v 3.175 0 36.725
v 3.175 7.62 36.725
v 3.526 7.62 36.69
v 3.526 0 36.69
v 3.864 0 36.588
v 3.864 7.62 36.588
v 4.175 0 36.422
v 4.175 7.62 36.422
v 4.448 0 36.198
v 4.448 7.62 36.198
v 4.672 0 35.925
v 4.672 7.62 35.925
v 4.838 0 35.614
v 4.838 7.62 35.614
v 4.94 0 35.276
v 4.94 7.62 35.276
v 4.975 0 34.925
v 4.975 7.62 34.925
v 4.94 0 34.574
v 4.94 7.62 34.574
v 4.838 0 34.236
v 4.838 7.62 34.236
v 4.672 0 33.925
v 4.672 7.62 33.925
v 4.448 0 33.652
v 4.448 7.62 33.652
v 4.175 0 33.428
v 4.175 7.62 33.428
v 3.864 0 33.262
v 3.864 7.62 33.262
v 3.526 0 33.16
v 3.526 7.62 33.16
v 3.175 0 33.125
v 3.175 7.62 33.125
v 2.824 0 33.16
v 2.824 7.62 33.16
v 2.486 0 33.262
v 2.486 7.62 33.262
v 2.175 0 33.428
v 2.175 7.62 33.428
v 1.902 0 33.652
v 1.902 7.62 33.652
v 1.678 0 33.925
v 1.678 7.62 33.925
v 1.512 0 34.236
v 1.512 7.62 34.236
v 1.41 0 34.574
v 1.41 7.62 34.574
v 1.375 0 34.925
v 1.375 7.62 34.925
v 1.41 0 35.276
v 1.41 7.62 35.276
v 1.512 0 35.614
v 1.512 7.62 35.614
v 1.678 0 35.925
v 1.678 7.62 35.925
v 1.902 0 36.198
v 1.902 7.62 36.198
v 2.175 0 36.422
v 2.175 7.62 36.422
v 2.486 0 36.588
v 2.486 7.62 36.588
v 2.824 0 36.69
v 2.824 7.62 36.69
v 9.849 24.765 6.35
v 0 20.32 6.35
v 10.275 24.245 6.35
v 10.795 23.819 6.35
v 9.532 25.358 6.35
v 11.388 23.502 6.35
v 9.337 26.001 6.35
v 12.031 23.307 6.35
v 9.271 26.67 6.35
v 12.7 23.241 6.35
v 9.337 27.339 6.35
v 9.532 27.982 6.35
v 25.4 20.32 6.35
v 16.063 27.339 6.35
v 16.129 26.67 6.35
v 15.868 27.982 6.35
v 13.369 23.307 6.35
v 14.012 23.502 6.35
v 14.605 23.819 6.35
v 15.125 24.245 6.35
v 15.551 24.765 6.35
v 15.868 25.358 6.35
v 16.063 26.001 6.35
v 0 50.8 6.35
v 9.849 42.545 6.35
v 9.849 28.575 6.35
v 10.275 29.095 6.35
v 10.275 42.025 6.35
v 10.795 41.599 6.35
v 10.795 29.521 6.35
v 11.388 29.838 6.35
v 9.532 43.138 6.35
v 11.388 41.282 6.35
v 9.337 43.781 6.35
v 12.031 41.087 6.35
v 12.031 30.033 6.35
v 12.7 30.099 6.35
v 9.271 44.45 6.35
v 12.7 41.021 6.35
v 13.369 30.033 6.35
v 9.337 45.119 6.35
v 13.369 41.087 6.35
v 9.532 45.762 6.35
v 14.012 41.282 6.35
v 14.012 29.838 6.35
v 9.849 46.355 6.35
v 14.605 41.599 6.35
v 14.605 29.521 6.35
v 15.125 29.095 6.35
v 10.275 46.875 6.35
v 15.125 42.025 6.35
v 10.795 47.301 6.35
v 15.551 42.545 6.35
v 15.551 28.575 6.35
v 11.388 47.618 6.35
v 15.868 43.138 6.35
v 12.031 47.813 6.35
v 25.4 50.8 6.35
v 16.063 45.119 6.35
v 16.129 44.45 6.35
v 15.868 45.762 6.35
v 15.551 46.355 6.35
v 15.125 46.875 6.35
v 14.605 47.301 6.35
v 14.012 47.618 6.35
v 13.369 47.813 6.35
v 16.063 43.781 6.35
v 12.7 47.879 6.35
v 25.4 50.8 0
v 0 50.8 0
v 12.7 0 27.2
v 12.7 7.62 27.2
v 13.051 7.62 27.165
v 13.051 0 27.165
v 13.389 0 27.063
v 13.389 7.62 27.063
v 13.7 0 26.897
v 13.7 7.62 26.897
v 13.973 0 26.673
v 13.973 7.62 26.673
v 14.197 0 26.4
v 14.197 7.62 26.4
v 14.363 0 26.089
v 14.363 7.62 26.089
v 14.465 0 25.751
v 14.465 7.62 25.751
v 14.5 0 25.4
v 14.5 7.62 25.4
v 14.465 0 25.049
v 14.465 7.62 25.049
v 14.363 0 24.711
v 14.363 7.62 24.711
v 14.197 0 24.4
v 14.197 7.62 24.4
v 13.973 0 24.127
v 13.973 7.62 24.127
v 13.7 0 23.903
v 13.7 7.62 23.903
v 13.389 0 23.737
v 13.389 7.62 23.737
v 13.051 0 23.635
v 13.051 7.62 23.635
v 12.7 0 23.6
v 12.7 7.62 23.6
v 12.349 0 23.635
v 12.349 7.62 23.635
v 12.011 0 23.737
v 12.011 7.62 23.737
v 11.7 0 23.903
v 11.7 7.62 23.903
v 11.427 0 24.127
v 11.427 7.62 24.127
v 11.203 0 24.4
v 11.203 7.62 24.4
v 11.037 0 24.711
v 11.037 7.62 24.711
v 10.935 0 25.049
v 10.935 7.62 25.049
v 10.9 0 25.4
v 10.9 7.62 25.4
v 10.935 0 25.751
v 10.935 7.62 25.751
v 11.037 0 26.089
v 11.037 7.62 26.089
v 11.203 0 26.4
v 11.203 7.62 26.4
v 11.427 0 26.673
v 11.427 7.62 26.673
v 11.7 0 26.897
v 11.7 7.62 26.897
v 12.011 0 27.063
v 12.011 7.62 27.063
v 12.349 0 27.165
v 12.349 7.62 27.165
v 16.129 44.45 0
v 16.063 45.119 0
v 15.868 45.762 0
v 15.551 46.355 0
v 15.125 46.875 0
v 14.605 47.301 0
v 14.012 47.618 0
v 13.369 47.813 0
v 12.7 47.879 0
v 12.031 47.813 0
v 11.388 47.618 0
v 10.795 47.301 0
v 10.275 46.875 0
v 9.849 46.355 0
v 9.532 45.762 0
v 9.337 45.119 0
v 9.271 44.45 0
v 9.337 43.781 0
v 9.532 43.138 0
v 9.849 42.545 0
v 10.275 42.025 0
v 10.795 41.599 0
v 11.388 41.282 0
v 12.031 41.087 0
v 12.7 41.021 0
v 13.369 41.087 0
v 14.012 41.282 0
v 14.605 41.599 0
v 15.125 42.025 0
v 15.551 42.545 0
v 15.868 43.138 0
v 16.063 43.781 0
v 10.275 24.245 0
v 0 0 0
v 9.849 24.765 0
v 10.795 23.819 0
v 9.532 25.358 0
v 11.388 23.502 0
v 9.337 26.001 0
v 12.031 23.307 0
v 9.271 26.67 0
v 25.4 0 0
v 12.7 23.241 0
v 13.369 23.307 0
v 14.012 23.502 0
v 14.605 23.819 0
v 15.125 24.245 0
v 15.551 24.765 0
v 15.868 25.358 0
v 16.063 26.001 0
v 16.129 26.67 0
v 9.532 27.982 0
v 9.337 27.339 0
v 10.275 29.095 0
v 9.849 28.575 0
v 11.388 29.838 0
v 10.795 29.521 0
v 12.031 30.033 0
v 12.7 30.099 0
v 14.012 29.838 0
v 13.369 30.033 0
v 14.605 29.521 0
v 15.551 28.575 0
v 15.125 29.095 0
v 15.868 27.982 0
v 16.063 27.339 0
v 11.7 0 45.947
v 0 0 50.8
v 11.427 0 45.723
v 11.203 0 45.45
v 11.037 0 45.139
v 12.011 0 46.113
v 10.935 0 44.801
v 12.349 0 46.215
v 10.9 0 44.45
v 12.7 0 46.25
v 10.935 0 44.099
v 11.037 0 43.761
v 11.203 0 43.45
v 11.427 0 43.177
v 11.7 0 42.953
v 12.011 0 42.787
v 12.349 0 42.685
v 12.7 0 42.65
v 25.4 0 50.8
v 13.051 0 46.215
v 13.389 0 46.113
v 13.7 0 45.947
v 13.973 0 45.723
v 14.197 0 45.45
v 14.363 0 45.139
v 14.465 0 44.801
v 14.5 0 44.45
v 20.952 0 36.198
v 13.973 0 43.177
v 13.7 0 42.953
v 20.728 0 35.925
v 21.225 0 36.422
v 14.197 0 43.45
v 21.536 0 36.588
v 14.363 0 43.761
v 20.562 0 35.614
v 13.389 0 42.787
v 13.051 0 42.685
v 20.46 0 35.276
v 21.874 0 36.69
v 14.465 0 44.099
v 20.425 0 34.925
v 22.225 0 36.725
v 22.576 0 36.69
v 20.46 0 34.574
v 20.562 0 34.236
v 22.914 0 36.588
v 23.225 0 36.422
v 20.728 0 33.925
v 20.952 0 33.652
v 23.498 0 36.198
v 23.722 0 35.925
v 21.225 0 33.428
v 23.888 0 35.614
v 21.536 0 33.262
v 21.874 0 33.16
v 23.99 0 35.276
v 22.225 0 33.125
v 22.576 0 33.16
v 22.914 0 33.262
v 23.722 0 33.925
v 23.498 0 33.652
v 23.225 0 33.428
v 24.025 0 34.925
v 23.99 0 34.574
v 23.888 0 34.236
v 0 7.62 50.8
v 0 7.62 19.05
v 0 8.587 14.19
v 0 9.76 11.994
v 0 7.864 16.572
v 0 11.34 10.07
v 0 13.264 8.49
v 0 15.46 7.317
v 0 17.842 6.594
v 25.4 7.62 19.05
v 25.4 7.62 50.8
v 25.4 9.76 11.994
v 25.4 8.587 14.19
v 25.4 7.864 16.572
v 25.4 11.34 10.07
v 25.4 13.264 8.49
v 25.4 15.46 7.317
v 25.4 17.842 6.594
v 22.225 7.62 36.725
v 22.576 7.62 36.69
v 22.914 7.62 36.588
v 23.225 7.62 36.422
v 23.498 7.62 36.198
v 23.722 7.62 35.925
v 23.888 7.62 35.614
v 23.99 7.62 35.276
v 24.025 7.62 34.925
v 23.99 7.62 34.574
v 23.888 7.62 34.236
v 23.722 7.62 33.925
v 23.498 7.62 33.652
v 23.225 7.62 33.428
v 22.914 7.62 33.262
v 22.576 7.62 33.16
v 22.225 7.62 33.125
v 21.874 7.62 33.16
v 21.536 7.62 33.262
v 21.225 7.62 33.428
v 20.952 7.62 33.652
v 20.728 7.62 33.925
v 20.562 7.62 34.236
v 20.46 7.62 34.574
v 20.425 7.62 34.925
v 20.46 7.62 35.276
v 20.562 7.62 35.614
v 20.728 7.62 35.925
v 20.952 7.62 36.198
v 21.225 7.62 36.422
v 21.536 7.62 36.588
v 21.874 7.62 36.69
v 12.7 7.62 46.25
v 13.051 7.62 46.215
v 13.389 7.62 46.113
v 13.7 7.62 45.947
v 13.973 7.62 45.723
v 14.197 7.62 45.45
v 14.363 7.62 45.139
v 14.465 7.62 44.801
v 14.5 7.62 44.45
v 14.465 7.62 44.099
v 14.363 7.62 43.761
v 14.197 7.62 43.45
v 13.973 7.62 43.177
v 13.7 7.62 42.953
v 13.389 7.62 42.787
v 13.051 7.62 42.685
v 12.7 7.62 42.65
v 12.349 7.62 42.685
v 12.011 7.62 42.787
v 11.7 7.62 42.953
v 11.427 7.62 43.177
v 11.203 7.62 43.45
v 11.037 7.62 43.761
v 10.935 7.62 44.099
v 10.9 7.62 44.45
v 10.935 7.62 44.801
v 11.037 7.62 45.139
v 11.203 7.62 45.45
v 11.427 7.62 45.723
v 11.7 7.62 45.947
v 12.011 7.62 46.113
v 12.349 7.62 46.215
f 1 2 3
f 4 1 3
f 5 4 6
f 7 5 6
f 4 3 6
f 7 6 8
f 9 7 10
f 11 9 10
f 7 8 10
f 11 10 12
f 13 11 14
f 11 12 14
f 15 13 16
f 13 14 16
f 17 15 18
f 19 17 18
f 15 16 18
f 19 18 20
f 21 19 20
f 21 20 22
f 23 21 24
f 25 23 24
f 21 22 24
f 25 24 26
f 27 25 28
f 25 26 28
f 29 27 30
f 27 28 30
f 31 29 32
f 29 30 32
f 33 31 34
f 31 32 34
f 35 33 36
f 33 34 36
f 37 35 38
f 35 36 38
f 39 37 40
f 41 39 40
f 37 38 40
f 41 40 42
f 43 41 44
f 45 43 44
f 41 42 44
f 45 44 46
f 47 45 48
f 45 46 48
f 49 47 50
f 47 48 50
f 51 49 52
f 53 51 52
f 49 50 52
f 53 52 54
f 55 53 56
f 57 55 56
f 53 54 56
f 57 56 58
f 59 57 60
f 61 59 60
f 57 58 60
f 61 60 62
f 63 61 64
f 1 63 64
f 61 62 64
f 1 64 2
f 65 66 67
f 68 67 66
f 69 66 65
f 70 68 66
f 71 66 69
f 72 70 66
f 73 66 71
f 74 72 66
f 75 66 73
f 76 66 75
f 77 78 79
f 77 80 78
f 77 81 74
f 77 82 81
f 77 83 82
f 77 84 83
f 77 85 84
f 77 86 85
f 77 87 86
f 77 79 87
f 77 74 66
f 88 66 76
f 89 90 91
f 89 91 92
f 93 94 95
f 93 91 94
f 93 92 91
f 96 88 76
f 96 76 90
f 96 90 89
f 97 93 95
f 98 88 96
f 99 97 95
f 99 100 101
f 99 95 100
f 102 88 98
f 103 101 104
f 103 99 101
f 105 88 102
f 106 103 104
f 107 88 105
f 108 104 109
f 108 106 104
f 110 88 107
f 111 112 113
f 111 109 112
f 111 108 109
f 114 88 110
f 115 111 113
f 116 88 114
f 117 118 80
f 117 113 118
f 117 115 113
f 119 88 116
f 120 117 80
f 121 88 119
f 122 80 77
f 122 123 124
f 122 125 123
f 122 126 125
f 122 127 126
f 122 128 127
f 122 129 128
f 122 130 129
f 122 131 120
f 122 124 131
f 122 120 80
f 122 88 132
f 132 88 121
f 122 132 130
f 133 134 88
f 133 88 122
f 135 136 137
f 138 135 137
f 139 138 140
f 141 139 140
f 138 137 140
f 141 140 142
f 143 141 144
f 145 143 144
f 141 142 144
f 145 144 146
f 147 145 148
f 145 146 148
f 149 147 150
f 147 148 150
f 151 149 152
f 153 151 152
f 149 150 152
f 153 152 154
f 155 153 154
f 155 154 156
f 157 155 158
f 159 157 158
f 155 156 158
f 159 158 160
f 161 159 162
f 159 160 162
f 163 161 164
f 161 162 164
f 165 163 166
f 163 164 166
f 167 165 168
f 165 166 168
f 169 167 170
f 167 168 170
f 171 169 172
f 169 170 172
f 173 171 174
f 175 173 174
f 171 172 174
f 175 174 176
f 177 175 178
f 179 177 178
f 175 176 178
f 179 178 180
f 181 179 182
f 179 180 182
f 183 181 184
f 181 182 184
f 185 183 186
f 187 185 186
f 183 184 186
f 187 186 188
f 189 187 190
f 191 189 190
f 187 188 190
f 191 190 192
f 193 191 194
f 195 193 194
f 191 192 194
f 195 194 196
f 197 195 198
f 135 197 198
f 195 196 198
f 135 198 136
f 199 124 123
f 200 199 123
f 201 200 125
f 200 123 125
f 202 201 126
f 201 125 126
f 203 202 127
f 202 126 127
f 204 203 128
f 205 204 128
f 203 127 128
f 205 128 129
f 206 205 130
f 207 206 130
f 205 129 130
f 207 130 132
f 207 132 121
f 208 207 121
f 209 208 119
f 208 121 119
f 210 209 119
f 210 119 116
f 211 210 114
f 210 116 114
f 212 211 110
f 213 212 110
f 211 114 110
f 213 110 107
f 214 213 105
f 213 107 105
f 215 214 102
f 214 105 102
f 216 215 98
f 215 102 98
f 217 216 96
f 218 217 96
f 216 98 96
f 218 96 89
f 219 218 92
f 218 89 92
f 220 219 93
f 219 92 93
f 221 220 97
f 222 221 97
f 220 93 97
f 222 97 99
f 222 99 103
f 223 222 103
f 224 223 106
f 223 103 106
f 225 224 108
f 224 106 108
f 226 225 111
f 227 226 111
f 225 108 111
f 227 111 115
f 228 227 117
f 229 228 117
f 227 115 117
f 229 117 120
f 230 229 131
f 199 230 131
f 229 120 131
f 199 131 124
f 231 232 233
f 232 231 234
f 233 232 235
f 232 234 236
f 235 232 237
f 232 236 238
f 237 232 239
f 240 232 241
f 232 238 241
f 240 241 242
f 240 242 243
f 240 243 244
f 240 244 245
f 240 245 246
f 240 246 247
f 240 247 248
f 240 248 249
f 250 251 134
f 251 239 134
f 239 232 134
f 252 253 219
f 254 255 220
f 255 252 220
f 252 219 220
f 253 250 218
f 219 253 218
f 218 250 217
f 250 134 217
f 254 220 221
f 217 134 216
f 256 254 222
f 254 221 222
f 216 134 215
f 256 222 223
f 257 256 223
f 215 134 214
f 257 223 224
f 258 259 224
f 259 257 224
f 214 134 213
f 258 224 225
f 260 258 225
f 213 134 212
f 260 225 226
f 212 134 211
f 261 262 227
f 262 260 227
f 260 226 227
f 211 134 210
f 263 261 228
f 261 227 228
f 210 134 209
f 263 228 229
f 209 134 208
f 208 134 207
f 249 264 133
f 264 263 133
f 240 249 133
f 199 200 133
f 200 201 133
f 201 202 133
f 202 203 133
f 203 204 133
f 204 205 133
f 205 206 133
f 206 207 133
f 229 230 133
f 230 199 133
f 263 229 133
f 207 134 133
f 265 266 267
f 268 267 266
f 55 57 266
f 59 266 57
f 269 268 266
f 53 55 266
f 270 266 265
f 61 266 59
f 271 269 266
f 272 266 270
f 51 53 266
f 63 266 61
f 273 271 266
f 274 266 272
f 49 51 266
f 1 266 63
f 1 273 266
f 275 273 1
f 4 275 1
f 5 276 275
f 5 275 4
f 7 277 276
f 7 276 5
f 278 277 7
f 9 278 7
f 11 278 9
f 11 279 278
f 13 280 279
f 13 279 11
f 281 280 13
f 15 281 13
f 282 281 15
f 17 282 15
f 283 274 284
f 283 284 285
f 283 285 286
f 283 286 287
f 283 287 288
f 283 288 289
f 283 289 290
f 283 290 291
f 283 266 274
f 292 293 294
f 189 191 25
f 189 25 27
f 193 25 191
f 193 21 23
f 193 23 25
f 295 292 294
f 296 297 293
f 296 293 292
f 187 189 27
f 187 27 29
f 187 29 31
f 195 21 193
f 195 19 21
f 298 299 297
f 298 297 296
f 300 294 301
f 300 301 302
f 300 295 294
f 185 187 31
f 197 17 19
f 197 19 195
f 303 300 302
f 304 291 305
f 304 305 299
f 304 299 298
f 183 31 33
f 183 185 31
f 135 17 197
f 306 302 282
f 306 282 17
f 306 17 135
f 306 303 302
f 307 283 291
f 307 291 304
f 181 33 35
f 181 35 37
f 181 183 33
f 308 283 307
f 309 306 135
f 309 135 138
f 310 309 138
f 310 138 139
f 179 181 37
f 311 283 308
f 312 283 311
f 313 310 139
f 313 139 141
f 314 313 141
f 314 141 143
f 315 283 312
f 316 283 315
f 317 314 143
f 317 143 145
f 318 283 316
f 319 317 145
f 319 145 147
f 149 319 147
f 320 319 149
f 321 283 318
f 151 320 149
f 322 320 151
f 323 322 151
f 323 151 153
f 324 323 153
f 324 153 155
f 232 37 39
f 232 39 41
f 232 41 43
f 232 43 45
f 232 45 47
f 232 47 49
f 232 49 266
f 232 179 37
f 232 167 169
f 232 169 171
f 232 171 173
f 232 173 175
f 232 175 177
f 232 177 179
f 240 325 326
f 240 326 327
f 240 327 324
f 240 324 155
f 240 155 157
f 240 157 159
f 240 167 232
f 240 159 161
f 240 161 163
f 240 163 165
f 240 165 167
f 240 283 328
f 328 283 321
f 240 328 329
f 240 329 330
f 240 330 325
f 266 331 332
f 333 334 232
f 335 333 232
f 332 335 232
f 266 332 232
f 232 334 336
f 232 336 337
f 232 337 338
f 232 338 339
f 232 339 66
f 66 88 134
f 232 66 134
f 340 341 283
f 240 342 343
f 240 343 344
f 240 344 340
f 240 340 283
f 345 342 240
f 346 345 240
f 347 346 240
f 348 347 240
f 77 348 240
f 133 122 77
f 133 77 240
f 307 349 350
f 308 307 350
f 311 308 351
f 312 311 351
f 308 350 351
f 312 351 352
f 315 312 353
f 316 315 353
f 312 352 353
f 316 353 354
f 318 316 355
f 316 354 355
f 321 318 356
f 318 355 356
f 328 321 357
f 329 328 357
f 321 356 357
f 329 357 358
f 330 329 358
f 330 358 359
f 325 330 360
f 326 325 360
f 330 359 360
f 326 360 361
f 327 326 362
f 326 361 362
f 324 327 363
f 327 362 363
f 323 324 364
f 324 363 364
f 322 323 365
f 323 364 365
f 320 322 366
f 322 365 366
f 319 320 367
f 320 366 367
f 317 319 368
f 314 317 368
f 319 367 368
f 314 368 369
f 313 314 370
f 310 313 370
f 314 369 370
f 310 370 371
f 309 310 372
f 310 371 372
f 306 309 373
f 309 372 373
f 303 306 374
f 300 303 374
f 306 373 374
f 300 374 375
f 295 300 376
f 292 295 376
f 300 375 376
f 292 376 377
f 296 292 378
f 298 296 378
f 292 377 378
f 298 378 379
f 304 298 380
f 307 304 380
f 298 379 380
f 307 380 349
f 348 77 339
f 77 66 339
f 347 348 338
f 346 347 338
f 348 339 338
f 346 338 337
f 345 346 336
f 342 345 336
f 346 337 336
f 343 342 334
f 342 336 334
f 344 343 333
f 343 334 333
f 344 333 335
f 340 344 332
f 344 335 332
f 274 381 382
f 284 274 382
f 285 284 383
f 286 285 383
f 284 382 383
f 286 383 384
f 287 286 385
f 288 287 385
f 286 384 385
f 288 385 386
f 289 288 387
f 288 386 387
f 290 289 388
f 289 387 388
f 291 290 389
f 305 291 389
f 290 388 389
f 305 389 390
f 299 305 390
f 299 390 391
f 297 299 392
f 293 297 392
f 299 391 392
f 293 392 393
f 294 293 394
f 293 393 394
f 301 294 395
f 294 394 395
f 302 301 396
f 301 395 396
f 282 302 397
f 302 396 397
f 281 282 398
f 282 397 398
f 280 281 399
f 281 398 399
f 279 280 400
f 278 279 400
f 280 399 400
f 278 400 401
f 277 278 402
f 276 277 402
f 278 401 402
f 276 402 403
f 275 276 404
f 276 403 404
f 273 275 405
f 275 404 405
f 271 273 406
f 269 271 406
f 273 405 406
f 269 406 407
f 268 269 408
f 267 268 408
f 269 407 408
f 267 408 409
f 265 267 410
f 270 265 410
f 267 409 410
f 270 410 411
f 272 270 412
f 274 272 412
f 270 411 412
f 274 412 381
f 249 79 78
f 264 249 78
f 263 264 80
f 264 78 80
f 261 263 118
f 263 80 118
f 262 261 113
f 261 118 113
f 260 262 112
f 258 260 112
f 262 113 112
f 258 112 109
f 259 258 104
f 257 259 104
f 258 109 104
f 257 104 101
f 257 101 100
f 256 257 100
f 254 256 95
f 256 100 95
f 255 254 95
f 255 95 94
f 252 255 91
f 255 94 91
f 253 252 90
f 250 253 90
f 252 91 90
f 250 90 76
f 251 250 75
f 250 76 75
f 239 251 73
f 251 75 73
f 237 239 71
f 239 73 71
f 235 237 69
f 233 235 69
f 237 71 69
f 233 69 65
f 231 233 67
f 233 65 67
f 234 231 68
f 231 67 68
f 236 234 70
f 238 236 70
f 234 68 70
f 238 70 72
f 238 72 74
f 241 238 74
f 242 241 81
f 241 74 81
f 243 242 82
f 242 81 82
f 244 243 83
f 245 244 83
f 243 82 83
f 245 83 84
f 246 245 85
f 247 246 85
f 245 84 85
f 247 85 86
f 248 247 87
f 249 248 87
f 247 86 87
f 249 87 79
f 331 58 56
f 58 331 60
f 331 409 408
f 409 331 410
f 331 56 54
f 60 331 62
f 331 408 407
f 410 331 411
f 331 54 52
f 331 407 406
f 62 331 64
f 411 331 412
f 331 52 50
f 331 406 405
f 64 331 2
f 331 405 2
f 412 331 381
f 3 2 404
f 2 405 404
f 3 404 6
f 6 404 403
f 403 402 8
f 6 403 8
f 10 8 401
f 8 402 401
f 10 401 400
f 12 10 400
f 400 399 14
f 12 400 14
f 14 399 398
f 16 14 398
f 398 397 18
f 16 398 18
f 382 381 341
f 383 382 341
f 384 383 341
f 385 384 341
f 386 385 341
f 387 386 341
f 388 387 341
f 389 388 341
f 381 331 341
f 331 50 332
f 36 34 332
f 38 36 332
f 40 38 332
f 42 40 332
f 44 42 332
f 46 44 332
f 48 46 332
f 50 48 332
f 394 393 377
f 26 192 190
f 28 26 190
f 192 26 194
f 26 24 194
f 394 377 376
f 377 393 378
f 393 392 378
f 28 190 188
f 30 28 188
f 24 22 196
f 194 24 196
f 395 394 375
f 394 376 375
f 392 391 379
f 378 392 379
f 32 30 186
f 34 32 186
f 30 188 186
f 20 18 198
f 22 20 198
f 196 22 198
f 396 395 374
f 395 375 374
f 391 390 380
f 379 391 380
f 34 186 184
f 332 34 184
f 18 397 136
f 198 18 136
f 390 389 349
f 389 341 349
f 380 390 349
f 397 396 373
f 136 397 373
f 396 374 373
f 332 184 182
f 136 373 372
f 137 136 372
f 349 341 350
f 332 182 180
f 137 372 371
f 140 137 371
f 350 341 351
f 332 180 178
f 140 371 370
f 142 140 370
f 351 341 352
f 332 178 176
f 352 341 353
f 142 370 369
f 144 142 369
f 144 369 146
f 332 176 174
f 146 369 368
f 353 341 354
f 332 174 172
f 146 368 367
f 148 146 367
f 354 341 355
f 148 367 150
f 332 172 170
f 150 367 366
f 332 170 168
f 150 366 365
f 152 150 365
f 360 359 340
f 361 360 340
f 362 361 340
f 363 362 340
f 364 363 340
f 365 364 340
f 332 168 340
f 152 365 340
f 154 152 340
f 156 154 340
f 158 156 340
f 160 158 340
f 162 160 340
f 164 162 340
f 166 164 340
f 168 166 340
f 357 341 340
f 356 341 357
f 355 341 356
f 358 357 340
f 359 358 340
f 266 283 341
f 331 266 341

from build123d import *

# Parameters (mm, degrees)
SKETCH1_W           = 25.4
SKETCH1_H           = 50.8
BOSS_EXTRUDE1_DEPTH = 6.35
SKETCH2_W           = 44.45
SKETCH2_H           = 7.62
BOSS_EXTRUDE2_DEPTH = 25.4
FILLET1_R           = 12.7
SKETCH3_R           = 3.429
CUT_EXTRUDE1_DEPTH  = 6.35
SKETCH4_R           = 1.8
CUT_EXTRUDE2_DEPTH  = 7.62


with BuildPart() as part:
    # Sketch1 → Boss-Extrude1 (new body)
    with BuildSketch(Plane.XY):
        with Locations((12.7, 25.4)):
            Rectangle(SKETCH1_W, SKETCH1_H)
    extrude(amount=BOSS_EXTRUDE1_DEPTH)

    # Sketch2 → Boss-Extrude2 (add)
    with BuildSketch(Plane(origin=(25.4, 0, 0), x_dir=(0, 0, -1), z_dir=(1, 0, 0))):
        with Locations((-28.575, 3.81)):
            Rectangle(SKETCH2_W, SKETCH2_H)
    extrude(amount=-BOSS_EXTRUDE2_DEPTH)

    # Fillet1
    fillet1_edges = [part.edges().sort_by_distance(p)[0] for p in [
        (12.7, 7.62, 6.35),
    ]]
    fillet(fillet1_edges, radius=FILLET1_R)

    # Sketch3 → Cut-Extrude1 (cut)
    with BuildSketch(Plane.XY.offset(6.35)):
        with Locations((12.7, 44.45)):
            Circle(SKETCH3_R)
        with Locations((12.7, 26.67)):
            Circle(SKETCH3_R)
    extrude(amount=-CUT_EXTRUDE1_DEPTH, mode=Mode.SUBTRACT)

    # Sketch4 → Cut-Extrude2 (cut)
    with BuildSketch(Plane(origin=(0, 7.62, 0), x_dir=(1, 0, 0), z_dir=(0, 1, 0))):
        with Locations(Location((12.7, -25.4, 0), (0, 0, 270))):
            Circle(SKETCH4_R)
        with Locations(Location((22.225, -34.925, 0), (0, 0, 270))):
            Circle(SKETCH4_R)
        with Locations(Location((12.7, -44.45, 0), (0, 0, 270))):
            Circle(SKETCH4_R)
        with Locations(Location((3.175, -34.925, 0), (0, 0, 270))):
            Circle(SKETCH4_R)
    extrude(amount=-CUT_EXTRUDE2_DEPTH, mode=Mode.SUBTRACT)


solid = part.part
